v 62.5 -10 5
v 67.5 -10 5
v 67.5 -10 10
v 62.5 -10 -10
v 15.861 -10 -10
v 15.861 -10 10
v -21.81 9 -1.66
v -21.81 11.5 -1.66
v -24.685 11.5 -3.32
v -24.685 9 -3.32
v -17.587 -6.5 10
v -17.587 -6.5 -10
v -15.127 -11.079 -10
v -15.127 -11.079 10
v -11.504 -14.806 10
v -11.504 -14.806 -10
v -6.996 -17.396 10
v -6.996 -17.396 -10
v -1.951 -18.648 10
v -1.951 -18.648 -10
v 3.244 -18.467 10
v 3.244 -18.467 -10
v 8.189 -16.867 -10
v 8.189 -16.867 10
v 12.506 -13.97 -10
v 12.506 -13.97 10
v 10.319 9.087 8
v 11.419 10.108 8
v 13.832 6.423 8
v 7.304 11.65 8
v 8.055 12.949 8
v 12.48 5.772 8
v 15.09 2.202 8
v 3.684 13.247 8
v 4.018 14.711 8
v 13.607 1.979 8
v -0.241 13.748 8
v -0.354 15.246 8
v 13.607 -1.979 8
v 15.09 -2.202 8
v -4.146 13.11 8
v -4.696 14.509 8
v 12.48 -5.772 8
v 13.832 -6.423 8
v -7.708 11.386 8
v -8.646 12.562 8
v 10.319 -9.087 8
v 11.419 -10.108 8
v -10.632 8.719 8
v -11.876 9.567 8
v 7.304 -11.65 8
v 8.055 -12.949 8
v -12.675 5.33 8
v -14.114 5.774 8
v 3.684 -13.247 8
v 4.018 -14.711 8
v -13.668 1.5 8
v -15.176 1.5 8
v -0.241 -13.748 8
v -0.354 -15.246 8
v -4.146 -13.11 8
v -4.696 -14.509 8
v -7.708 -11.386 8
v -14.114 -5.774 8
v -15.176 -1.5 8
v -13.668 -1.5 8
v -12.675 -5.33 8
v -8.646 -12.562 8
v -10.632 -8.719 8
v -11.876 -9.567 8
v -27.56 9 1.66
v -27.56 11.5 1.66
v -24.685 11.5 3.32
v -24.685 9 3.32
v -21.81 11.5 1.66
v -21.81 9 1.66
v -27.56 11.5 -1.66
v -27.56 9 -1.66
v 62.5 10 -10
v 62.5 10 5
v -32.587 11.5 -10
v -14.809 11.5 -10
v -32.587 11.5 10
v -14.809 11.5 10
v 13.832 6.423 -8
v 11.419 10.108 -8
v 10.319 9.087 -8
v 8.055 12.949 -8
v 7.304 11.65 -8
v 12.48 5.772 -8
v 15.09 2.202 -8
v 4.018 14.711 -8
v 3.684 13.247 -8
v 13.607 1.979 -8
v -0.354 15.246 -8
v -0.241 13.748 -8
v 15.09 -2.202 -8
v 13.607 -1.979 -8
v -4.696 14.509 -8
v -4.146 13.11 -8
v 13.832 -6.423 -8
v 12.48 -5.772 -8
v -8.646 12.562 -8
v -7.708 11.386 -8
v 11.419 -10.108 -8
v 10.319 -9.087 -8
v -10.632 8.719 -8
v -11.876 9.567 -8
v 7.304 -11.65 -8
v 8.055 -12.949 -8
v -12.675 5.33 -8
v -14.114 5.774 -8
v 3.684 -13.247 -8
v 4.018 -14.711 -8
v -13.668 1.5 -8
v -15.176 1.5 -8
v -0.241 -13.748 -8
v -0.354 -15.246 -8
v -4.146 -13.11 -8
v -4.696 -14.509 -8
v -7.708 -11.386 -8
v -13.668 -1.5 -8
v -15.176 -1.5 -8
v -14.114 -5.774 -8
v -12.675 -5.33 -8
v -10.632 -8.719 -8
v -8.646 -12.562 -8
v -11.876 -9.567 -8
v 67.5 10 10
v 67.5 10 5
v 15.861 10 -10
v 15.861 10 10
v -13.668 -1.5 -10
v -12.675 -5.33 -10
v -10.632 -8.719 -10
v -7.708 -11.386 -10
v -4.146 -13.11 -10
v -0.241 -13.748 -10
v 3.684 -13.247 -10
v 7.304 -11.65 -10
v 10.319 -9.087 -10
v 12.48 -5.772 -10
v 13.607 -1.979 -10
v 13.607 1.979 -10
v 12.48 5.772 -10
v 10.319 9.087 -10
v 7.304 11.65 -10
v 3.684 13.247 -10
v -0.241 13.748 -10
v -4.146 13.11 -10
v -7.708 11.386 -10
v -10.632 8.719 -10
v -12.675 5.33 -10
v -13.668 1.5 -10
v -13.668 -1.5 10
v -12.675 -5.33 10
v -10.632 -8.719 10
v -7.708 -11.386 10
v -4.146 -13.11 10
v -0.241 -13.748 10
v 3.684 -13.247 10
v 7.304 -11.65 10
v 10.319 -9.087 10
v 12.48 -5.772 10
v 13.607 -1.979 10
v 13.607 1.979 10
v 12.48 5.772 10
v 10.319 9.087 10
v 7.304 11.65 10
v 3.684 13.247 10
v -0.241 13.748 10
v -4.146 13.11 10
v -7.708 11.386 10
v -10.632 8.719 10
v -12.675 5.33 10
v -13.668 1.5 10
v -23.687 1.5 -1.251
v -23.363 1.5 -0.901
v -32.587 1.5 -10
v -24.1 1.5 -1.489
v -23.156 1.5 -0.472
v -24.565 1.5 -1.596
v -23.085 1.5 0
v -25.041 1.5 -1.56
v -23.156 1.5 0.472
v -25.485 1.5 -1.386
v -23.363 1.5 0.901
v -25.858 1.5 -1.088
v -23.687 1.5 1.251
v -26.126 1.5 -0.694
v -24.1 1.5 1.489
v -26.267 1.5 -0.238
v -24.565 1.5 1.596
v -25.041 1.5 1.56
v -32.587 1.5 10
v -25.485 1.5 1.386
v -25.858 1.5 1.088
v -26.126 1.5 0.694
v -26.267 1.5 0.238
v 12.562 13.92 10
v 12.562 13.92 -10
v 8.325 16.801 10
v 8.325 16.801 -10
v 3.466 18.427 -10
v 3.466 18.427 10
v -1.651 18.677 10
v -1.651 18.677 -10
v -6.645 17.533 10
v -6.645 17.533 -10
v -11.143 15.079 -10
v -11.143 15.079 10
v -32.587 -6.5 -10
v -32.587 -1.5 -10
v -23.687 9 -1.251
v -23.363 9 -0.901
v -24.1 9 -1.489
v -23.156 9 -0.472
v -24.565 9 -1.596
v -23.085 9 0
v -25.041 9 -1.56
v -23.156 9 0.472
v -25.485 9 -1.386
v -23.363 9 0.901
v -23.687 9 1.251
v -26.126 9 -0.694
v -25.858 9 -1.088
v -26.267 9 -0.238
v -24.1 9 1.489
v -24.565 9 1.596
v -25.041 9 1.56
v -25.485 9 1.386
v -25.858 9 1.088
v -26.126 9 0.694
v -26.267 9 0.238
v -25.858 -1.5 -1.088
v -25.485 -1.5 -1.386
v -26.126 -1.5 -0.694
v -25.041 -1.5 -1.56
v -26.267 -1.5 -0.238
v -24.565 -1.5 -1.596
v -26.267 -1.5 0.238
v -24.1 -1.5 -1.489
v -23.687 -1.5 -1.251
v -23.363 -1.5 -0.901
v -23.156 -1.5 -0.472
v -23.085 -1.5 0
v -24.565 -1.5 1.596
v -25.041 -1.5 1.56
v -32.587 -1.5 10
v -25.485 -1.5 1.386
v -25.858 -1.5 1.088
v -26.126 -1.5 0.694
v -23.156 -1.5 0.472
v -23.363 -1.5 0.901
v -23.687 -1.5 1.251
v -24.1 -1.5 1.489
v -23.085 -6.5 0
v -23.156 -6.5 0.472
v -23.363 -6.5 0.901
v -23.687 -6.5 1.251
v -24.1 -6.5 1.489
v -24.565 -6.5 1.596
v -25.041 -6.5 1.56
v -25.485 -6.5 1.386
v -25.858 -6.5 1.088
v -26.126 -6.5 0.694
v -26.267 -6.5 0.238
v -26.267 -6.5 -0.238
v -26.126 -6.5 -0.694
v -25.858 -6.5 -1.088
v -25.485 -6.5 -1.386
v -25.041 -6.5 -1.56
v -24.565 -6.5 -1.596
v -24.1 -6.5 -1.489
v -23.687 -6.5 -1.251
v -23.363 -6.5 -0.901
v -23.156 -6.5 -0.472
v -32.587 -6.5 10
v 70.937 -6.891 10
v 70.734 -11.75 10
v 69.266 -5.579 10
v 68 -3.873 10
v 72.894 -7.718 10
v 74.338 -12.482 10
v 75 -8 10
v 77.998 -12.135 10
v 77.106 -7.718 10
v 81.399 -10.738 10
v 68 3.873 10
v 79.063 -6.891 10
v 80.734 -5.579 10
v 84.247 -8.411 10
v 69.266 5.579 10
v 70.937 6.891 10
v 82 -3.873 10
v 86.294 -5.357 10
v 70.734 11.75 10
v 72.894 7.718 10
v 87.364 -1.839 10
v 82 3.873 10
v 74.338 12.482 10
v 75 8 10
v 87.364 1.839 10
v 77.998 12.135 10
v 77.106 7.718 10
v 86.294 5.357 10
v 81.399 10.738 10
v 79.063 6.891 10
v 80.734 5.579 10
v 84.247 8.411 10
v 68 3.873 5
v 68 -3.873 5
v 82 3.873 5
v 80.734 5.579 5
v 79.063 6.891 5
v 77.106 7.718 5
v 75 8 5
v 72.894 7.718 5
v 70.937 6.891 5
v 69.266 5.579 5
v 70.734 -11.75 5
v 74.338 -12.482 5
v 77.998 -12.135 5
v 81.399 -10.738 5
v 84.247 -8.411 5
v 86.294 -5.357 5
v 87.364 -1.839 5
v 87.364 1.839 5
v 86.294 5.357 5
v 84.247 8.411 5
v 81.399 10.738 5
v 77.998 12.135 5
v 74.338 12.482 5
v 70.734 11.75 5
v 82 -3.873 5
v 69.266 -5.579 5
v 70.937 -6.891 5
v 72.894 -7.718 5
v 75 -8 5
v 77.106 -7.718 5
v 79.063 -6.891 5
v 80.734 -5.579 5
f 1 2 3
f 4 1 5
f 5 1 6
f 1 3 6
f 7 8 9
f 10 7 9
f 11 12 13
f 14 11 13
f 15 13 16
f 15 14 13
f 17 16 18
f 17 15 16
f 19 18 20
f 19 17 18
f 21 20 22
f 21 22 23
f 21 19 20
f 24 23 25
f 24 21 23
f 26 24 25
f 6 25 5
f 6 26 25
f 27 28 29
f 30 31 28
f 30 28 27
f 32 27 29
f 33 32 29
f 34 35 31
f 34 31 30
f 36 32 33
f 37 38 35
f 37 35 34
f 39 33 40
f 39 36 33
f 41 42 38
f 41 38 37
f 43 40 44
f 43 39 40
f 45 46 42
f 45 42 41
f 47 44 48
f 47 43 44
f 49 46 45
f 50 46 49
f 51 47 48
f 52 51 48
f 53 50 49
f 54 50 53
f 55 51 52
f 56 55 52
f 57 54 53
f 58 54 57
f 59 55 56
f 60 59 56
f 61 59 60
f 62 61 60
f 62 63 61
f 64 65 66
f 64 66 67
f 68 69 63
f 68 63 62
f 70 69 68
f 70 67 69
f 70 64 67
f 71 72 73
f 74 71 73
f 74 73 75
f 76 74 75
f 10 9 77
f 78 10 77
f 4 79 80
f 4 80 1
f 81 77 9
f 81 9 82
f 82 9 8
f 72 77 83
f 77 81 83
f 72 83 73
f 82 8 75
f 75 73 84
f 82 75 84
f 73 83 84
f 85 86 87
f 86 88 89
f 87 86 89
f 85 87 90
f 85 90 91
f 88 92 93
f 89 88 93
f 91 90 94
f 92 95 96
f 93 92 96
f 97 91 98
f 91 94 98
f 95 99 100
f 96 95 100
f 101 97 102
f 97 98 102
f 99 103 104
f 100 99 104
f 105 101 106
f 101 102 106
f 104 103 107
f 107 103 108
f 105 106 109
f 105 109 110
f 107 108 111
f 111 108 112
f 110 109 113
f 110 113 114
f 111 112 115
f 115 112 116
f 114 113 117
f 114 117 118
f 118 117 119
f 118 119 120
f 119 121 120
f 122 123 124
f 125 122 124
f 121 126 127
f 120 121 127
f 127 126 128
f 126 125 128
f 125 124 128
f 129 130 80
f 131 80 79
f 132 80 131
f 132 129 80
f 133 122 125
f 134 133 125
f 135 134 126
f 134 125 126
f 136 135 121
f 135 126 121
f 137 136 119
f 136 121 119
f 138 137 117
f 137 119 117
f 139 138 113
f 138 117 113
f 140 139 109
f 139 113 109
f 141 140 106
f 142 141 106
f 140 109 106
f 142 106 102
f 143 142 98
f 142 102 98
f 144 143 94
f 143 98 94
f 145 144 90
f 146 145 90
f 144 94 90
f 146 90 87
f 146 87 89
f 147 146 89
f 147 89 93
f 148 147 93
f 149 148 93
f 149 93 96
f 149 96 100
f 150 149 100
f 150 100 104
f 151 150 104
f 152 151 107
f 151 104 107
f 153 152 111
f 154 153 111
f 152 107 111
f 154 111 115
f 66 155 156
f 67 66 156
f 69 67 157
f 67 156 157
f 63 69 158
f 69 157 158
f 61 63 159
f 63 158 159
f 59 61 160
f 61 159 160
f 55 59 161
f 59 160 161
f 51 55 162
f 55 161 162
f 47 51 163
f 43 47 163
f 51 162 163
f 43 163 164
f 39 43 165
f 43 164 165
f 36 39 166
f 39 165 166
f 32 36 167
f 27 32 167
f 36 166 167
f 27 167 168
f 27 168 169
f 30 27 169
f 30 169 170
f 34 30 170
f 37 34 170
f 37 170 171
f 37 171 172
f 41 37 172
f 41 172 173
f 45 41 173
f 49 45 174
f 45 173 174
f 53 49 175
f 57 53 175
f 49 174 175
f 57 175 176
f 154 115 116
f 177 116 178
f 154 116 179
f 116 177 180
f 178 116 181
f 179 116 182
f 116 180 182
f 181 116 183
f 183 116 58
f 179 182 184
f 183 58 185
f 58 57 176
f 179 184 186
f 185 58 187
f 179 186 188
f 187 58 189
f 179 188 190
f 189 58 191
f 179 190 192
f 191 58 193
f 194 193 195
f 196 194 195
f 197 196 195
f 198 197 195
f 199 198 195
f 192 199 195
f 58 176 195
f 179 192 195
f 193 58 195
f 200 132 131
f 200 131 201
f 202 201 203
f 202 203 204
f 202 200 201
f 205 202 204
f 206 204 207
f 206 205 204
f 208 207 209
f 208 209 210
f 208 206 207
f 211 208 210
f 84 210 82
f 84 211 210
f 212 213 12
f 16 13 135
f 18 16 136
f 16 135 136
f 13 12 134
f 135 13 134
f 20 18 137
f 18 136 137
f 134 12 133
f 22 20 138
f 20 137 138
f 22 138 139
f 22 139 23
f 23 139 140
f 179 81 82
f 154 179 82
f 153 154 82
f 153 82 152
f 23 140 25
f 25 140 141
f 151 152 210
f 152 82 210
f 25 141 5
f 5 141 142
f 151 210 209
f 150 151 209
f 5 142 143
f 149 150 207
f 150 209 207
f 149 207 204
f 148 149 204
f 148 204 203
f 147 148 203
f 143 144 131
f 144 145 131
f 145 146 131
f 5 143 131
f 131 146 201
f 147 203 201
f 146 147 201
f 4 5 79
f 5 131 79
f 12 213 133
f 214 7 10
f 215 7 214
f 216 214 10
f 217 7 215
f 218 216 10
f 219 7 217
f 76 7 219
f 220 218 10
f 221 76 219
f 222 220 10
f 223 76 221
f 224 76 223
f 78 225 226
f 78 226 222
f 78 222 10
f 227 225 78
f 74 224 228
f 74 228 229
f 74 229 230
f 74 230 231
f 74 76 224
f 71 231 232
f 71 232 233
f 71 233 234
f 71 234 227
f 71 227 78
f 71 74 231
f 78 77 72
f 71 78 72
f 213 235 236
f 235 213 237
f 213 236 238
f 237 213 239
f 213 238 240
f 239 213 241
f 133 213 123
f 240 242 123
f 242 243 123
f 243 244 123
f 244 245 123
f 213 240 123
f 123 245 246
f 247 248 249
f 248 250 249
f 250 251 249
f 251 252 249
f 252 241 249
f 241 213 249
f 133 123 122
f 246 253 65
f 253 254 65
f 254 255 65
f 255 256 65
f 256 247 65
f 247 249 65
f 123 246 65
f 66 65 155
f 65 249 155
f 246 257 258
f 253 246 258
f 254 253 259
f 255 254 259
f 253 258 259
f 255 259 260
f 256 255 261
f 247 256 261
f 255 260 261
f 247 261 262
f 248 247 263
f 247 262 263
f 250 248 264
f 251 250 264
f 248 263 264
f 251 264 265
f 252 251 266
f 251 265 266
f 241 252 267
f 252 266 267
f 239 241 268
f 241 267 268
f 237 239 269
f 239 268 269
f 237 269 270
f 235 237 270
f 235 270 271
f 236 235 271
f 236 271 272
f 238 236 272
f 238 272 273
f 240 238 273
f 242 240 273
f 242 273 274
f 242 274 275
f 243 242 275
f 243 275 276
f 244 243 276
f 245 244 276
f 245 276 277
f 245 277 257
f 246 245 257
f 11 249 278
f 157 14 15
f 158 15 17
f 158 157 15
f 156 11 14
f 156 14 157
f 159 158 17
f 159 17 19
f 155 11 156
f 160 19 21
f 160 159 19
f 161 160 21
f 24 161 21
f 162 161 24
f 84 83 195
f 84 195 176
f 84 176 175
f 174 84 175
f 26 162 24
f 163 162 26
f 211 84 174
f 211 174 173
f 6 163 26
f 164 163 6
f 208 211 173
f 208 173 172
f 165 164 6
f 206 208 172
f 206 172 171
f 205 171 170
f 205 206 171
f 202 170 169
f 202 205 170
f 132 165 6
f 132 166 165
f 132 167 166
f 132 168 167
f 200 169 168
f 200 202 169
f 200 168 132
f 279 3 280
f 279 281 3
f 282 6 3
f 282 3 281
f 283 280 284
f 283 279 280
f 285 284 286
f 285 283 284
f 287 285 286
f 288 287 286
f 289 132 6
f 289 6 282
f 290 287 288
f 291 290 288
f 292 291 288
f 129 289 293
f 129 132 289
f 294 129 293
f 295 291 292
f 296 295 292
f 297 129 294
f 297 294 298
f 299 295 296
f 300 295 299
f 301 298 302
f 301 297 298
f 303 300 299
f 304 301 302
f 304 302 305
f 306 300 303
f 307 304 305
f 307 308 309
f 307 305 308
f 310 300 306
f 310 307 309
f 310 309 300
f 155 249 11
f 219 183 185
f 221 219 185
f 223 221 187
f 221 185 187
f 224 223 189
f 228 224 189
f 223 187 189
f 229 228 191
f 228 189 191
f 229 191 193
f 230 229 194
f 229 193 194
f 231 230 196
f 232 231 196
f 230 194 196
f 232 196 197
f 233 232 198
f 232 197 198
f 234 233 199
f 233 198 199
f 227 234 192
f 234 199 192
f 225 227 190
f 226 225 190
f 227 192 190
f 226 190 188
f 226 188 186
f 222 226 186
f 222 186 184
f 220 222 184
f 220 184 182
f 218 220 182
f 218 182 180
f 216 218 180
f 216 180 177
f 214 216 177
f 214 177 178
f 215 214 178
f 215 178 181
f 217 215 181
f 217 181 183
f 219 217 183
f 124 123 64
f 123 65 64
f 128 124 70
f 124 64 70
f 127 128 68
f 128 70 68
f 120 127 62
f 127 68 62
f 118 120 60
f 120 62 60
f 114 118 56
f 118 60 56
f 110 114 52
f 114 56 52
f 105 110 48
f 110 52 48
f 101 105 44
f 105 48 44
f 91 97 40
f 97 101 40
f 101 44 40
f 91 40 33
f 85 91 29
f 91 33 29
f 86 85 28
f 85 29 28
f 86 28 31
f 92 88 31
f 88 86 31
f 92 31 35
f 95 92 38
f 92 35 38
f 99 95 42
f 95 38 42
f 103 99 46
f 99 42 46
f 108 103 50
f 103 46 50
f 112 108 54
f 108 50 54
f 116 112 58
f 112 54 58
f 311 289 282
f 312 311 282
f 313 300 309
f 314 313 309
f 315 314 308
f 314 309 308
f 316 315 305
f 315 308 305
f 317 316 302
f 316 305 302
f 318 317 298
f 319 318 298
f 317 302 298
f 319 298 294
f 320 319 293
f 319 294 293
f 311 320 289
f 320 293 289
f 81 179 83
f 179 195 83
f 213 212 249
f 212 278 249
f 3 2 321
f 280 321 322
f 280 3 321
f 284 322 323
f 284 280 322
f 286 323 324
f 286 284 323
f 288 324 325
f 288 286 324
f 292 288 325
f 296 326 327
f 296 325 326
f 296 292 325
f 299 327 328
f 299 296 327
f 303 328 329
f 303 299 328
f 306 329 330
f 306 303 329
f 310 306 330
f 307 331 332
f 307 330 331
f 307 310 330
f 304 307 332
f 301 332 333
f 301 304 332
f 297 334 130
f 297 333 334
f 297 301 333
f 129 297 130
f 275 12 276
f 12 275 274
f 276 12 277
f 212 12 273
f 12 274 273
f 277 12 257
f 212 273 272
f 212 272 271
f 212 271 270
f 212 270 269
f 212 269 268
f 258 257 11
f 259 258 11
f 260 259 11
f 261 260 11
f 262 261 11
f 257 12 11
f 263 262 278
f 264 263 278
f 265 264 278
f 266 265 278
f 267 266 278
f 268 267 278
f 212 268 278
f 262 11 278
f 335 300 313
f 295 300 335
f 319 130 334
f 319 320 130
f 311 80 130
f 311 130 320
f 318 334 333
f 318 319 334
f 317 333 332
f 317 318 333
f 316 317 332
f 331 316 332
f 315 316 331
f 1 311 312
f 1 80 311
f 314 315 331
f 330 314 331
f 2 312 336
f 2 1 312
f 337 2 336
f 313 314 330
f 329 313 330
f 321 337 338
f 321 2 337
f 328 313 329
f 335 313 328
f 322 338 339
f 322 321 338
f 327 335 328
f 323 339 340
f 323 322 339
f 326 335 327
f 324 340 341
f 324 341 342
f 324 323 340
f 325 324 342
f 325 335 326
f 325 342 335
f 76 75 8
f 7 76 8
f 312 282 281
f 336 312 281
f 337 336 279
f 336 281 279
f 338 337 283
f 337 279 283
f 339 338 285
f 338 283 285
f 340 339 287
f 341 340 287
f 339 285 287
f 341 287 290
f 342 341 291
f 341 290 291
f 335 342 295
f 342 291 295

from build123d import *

# Parameters (mm, degrees)
PAD_DEPTH       = 10
SKETCH001_R     = 1.6
POCKET_DEPTH    = 25.251
POCKET002_DEPTH = 5
SKETCH005_W     = 15.25
SKETCH005_H     = 16
POCKET003_DEPTH = 15
POCKET004_DEPTH = 2.5


with BuildPart() as part:
    # Sketch → Pad (new body, symmetric)
    with BuildSketch(Plane.XY):
        with BuildLine():
            ThreePointArc((-17.587282, -6.5), (-1.951346, -18.648183), (15.860722, -10))
            Line((67.5, -10), (15.860722, -10))
            ThreePointArc((67.5, -10), (87.5, 0), (67.5, 10))
            Line((67.5, 10), (15.860722, 10))
            ThreePointArc((15.860722, 10), (0.915927, 18.727615), (-14.809203, 11.5))
            Line((-32.587282, 11.5), (-14.809203, 11.5))
            Line((-32.587282, 1.5), (-32.587282, 11.5))
            Line((-13.667937, 1.5), (-32.587282, 1.5))
            ThreePointArc((-13.667937, -1.5), (13.75, 0), (-13.667937, 1.5))
            Line((-32.587282, -1.5), (-13.667937, -1.5))
            Line((-32.587282, -6.5), (-32.587282, -1.5))
            Line((-17.587282, -6.5), (-32.587282, -6.5))
        make_face()
        with BuildLine():
            ThreePointArc((68, -3.872983), (75, -8), (82, -3.872983))
            Line((82, 3.872983), (82, -3.872983))
            ThreePointArc((82, 3.872983), (75, 8), (68, 3.872983))
            Line((68, 3.872983), (68, -3.872983))
        make_face(mode=Mode.SUBTRACT)
    extrude(amount=PAD_DEPTH, both=True)

    # Sketch001 (on Face1 of Pad) → Pocket (cut, through all)
    with BuildSketch(Plane.XZ.offset(6.5)):
        with Locations((-24.684659, 0)):
            Circle(SKETCH001_R)
    extrude(amount=-POCKET_DEPTH, mode=Mode.SUBTRACT)

    # Sketch003 → Pocket002 (cut)
    with BuildSketch(Plane.XZ.offset(12.5)):
        Polygon((100.061388, 3.464102), (97.061388, 1.732051), (97.061388, -1.732051), (100.061388, -3.464102), (103.061388, -1.732051), (103.061388, 1.732051), align=None)
    extrude(amount=-POCKET002_DEPTH, mode=Mode.SUBTRACT)

    # Sketch005 → Groove (revolve, cut)
    with BuildSketch(Plane.YZ):
        with Locations((7.625, 0)):
            Rectangle(SKETCH005_W, SKETCH005_H)
    revolve(axis=Axis((0, 0, 0), (0, 0, 1)), mode=Mode.SUBTRACT)

    # Sketch006 (on Face3 of Groove) → Pocket003 (cut)
    with BuildSketch(Plane(origin=(0, 0, -10), x_dir=(1, 0, 0), z_dir=(0, 0, -1))):
        with BuildLine():
            ThreePointArc((67.5, -10), (87.5, 0), (67.5, 10))
            Line((67.5, 10), (62.5, 10))
            Line((62.5, -10), (62.5, 10))
            Line((67.5, -10), (62.5, -10))
        make_face()
    extrude(amount=-POCKET003_DEPTH, mode=Mode.SUBTRACT)

    # Sketch007 (on Face12 of Pocket003) → Pocket004 (cut)
    with BuildSketch(Plane(origin=(0, 11.5, 0), x_dir=(-1, 0, 0), z_dir=(0, 1, 0))):
        Polygon((24.684659, 3.319764), (21.809659, 1.659882), (21.809659, -1.659882), (24.684659, -3.319764), (27.559659, -1.659882), (27.559659, 1.659882), align=None)
    extrude(amount=-POCKET004_DEPTH, mode=Mode.SUBTRACT)


solid = part.part
